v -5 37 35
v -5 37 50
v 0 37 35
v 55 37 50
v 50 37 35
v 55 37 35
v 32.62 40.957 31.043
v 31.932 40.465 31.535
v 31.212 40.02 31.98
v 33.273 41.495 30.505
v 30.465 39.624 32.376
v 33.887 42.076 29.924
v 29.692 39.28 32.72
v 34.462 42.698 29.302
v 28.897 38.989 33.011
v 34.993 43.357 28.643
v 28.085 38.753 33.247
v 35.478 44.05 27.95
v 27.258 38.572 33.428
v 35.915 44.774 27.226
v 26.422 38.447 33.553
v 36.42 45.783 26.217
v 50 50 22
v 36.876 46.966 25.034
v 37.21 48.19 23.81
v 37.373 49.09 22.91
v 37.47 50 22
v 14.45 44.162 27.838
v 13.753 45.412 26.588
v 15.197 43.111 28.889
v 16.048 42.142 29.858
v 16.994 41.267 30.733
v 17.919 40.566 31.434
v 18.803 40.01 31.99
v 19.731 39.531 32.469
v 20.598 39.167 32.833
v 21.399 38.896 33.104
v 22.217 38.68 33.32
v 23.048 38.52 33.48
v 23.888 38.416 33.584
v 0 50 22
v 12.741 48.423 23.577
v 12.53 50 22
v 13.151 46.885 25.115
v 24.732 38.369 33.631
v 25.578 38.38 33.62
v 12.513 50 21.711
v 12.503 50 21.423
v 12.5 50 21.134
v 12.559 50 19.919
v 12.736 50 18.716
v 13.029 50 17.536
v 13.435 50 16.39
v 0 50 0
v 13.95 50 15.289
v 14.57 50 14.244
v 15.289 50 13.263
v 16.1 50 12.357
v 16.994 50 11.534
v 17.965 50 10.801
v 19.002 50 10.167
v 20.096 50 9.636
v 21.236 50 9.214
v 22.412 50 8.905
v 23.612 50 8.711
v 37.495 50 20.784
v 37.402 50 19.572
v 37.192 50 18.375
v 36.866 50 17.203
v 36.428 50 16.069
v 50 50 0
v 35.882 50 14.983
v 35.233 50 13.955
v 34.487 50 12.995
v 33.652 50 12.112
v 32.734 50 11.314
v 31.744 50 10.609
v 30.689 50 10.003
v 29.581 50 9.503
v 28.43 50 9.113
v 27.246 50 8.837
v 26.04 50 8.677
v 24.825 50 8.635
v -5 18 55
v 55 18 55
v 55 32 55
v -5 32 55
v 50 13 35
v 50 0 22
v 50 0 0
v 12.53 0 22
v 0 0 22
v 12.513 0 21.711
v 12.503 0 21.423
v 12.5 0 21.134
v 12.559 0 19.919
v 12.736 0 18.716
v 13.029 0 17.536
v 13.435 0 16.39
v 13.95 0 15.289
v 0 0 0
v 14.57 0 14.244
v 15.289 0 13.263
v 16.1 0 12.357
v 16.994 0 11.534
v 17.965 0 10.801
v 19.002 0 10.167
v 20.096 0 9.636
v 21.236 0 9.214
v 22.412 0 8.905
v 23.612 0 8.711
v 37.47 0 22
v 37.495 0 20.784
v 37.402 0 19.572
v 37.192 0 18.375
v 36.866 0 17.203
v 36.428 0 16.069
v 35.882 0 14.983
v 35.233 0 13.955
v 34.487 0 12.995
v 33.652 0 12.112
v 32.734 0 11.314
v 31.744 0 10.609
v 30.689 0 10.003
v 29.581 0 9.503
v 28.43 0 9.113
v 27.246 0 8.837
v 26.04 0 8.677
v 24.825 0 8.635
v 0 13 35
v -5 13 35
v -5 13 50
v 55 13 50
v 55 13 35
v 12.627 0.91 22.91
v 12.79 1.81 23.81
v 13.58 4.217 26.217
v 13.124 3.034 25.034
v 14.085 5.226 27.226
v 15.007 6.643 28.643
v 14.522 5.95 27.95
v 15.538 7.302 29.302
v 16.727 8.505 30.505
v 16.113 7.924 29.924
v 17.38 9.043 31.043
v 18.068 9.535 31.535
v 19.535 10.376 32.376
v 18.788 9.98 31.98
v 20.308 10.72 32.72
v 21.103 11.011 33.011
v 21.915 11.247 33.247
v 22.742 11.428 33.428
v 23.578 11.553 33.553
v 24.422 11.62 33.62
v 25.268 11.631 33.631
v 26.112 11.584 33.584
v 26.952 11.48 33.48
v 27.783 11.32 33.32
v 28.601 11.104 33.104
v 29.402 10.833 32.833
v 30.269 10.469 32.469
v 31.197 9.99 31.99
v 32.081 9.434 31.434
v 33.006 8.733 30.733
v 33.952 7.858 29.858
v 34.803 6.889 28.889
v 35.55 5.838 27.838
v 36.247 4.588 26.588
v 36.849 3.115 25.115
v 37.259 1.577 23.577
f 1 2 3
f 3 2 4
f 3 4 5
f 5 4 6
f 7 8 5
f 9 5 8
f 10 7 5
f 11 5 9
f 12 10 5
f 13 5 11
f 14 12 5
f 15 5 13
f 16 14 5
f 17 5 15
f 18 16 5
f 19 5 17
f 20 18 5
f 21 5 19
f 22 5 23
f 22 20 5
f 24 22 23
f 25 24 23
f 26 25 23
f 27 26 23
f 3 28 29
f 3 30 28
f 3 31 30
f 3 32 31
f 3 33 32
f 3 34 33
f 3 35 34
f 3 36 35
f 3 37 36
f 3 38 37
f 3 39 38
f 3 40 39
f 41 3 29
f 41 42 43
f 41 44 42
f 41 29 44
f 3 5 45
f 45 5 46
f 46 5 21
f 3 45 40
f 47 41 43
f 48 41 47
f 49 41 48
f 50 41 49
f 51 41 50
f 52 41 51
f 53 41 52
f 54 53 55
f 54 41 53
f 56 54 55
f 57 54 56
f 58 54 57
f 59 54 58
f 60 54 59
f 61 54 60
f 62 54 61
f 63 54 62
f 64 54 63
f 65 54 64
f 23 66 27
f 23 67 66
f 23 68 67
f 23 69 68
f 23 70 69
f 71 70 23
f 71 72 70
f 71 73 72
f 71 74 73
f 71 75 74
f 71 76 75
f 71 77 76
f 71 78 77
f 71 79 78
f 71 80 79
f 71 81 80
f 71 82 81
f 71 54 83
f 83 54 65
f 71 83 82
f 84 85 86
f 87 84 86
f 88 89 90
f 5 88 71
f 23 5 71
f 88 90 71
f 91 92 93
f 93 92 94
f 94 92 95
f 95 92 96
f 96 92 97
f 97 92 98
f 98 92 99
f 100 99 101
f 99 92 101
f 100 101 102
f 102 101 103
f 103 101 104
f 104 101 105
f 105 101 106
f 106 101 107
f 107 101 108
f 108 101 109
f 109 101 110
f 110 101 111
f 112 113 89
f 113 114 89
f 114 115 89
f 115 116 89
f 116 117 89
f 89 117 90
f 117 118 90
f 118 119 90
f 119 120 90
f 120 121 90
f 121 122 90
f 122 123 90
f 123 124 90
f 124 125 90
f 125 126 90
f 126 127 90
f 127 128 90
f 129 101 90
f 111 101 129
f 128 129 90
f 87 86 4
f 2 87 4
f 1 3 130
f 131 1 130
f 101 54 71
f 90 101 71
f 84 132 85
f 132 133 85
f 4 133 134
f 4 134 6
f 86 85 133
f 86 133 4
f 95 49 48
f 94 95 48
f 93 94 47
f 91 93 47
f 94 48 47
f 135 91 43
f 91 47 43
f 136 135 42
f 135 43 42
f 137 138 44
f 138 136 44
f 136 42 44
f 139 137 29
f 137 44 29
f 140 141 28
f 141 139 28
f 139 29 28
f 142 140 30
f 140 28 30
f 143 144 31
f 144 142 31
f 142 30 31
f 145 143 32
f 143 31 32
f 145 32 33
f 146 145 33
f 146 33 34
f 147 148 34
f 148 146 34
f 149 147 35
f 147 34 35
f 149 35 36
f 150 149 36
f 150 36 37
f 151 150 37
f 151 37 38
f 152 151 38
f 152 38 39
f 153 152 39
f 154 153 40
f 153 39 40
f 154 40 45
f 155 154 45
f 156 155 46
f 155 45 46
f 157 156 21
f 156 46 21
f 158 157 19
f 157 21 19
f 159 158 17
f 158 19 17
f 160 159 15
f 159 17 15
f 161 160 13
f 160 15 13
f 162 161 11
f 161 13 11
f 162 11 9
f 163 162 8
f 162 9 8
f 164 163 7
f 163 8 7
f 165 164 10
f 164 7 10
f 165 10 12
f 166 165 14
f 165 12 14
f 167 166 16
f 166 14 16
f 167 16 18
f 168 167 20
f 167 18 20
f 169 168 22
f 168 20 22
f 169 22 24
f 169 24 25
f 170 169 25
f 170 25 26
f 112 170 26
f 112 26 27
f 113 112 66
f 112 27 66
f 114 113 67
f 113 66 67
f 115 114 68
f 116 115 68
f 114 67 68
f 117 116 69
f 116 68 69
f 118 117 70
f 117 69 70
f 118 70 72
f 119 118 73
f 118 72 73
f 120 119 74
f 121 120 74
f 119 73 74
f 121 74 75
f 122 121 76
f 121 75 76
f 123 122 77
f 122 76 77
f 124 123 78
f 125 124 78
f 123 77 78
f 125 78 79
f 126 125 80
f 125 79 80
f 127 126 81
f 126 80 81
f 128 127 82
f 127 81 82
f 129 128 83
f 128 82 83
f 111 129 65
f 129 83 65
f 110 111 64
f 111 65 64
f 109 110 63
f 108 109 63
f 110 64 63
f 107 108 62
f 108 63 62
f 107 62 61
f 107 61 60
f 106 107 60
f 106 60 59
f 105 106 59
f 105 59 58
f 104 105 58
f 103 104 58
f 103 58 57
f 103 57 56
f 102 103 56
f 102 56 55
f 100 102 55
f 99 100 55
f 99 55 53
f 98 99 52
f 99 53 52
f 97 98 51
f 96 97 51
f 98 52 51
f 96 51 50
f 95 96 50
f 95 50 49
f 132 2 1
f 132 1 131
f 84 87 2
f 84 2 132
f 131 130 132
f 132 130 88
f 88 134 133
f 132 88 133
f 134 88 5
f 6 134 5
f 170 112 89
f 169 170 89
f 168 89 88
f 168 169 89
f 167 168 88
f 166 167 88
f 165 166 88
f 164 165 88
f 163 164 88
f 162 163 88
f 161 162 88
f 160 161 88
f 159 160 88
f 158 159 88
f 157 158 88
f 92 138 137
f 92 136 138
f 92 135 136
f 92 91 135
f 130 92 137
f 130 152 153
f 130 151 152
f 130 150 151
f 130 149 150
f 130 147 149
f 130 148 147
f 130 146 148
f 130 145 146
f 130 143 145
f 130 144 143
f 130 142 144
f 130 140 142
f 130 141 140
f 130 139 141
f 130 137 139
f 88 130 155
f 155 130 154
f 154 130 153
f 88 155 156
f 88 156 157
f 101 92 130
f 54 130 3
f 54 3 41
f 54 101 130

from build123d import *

# Parameters (mm, degrees)
F0_W        = 50
F0_H        = 50
F1_DEPTH    = 35
F3_D        = 25
F4_T1_DEPTH = 116.8637576871
F5_T1_DEPTH = 116.8637576871
F6_DEPTH    = 20
F7_T1_DEPTH = 75.7168298797
F10_DEPTH   = 5
F12_DEPTH   = 5


# Not quite as in the source:
# - a fillet or chamfer that OpenCascade refuses, or shapes differently, is made with other operations: its cross-section is extruded or revolved along the edge and cut away or added
# - two fillets or chamfers of one size are made in one step


with BuildPart() as f1:
    # F0 (on Top) → F1 (new body)
    with BuildSketch(Plane.XY):
        with Locations((25, 25)):
            Rectangle(F0_W, F0_H)
    extrude(amount=F1_DEPTH)

    # F3 (through all)
    with Locations(Plane.XZ):
        with Locations((25, 21.1336053908)):
            Hole(F3_D / 2)

    # F4: chamfer of 13 on 1 edges, made by hand

    # F4_s2 → F4_t1 (cut)
    with BuildSketch(Plane.YZ.offset(-33.4318788436)):
        Polygon((0, 22), (13, 35), (0, 35), align=None)
    extrude(amount=F4_T1_DEPTH, mode=Mode.SUBTRACT)

    # F5: chamfer of 13 on 1 edges, made by hand

    # F5_s2 → F5_t1 (cut)
    with BuildSketch(Plane.YZ.offset(-33.4318788436)):
        Polygon((37, 35), (50, 22), (50, 35), align=None)
    extrude(amount=F5_T1_DEPTH, mode=Mode.SUBTRACT)

    # F6 (add): a face of the model
    f6_faces = [f1.faces().sort_by_distance(p)[0] for p in [
        (25, 25, 35),
    ]]
    extrude(f6_faces, amount=F6_DEPTH)

    # F7: chamfer of 5 on 4 edges, made by hand

    # F7_s2 → F7_t1 (cut)
    with BuildSketch(Plane.YZ.offset(-12.8584149398)):
        Polygon((13, 50), (18, 55), (13, 55), align=None)
        Polygon((37, 50), (32, 55), (37, 55), align=None)
    extrude(amount=F7_T1_DEPTH, mode=Mode.SUBTRACT)

    # F9 (on face) → F10 (join)
    with BuildSketch(Plane.YZ.offset(50)):
        Polygon((13, 50), (13, 35), (37, 35), (37, 50), (32, 55), (18, 55), align=None)
    extrude(amount=F10_DEPTH)

    # F11 (on face) → F12 (join)
    with BuildSketch(Plane(origin=(0, 0, 0), x_dir=(0, -1, 0), z_dir=(-1, 0, 0))):
        Polygon((-37, 50), (-37, 35), (-13, 35), (-13, 50), (-18, 55), (-32, 55), align=None)
    extrude(amount=F12_DEPTH)


solid = f1.part
